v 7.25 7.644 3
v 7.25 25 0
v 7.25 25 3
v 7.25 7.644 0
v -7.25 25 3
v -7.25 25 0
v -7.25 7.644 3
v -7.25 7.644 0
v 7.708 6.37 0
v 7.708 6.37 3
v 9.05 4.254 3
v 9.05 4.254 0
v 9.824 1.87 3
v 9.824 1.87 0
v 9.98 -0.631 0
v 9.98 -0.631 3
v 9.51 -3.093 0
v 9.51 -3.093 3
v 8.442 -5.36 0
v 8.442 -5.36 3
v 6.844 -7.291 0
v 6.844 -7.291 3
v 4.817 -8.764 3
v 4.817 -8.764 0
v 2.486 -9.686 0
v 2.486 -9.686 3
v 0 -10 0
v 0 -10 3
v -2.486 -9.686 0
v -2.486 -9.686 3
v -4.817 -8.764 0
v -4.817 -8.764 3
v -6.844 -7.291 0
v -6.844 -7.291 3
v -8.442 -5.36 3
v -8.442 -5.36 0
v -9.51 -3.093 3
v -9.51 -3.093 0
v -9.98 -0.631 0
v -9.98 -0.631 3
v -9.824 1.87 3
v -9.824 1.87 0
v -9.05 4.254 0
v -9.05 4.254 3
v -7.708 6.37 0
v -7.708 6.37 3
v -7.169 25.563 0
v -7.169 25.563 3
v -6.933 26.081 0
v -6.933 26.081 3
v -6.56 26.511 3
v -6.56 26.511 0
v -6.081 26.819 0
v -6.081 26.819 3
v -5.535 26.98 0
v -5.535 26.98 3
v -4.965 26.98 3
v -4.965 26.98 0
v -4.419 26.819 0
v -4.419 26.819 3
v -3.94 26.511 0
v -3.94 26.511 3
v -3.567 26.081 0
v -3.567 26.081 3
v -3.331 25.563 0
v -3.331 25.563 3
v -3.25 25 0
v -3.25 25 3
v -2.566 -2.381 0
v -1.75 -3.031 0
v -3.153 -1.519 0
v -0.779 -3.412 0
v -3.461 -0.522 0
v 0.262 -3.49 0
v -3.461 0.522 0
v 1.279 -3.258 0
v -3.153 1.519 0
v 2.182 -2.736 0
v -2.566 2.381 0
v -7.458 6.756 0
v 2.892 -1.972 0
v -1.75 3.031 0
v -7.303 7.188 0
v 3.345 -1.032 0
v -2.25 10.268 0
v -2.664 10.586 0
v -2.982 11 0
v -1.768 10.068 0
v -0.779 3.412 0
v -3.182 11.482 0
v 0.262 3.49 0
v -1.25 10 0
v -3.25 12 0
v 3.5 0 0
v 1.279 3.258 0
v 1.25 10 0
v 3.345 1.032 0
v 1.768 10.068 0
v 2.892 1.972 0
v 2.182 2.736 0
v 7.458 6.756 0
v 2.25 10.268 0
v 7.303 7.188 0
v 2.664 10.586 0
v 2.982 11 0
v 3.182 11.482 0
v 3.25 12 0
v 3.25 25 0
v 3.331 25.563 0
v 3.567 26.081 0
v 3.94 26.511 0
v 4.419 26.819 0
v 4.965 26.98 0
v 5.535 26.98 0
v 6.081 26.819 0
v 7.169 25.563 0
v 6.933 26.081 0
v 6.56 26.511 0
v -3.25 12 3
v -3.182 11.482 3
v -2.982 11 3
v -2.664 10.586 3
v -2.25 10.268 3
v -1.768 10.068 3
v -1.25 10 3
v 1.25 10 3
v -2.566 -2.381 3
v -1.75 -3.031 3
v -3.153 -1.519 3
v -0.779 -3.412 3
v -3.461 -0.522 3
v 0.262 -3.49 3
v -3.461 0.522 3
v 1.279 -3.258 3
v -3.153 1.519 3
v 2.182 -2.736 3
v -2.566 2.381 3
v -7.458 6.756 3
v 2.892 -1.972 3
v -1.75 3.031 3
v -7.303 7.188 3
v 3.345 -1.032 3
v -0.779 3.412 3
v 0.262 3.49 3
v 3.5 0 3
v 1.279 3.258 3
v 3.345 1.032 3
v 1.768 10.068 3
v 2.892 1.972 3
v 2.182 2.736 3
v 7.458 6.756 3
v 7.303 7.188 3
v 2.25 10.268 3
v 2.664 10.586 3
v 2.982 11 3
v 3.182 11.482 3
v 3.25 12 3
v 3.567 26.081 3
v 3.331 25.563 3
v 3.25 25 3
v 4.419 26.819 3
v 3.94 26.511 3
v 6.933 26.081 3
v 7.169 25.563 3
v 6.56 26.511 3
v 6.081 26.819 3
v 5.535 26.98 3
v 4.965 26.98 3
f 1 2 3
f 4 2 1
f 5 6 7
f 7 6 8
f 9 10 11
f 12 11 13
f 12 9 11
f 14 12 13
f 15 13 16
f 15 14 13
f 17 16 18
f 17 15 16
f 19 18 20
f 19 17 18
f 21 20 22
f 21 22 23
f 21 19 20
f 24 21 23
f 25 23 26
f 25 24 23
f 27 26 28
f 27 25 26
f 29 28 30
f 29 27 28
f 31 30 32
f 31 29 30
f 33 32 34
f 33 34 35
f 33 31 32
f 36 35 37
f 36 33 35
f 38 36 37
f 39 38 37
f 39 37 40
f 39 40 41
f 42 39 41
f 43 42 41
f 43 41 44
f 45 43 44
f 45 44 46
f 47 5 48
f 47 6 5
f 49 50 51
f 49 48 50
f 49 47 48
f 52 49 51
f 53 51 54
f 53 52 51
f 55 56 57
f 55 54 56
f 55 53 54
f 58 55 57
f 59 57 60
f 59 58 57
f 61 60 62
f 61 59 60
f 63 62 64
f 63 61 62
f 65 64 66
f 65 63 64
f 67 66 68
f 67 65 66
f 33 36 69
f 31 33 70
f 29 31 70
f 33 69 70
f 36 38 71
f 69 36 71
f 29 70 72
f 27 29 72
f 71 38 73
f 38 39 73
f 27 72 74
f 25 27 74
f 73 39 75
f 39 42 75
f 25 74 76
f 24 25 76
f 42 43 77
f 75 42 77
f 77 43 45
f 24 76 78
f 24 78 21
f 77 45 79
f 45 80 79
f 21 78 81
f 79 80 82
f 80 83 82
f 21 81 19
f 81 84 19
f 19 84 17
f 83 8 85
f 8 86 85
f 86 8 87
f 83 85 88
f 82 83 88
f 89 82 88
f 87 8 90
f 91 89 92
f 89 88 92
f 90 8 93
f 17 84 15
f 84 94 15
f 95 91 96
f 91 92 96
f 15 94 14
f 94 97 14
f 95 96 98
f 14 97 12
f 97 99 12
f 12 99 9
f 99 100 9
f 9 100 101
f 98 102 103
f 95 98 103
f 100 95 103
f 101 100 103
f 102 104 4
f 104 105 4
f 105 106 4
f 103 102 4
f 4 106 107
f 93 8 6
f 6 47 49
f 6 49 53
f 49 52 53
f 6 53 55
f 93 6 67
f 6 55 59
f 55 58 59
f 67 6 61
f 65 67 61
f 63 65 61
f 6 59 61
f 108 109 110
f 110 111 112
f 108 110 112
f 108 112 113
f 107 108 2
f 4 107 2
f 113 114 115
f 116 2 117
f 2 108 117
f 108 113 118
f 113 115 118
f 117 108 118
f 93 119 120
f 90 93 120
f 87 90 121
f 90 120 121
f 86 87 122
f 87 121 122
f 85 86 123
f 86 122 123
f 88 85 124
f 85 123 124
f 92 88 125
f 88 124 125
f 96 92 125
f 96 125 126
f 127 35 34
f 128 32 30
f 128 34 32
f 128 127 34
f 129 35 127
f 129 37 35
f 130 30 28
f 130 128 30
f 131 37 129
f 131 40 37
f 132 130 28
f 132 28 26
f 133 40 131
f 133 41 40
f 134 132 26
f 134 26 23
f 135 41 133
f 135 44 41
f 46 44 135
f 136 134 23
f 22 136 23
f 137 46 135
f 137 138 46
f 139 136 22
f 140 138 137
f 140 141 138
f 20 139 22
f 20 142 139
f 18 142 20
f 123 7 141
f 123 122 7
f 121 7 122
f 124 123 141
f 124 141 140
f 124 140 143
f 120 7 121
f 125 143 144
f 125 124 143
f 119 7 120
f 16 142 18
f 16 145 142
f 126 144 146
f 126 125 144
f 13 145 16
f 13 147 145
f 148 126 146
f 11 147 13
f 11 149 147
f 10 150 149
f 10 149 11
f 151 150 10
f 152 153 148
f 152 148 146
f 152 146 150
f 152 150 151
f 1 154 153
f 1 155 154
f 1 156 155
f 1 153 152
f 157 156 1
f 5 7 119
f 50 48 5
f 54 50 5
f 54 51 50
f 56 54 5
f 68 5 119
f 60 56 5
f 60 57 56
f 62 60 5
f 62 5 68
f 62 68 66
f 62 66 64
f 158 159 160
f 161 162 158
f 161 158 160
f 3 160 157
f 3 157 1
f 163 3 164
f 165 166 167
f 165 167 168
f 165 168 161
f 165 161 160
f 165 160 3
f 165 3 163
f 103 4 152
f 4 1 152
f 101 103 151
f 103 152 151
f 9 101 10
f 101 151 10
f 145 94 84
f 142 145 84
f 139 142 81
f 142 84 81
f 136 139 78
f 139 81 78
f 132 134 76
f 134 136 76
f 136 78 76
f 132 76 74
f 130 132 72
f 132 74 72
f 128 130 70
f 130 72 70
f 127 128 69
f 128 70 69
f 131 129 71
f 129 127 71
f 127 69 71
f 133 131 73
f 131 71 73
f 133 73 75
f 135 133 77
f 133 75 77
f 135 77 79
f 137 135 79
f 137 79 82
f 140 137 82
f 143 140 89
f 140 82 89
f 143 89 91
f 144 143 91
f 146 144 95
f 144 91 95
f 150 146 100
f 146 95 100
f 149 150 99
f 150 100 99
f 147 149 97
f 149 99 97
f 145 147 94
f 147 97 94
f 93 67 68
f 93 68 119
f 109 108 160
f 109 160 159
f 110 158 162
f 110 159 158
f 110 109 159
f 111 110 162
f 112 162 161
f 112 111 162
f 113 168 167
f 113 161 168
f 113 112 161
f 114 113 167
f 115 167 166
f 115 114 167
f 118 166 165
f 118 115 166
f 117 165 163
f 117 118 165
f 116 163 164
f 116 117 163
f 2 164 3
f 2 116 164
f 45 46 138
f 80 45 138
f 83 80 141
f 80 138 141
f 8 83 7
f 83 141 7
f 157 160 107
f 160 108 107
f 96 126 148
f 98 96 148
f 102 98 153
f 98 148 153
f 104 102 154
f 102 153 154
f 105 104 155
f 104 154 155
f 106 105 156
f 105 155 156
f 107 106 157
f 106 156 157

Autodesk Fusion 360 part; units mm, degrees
sketch "Smartie Hopper servo arm" plane through (0, 0, 0) normal (0, 0, 1) x (1, 0, 0)
  circle A0 centre (0, 0) radius 10
  circle A1 centre (0, 0) radius 3.5
  line L0 (-3.25, 25) -> (-3.25, 10)
  line L1 (3.25, 25) -> (3.25, 10)
  line L2 (-7.25, 25) -> (-7.25, 6.8875)
  line L3 (7.25, 25) -> (7.25, 6.8875)
  line L4 (-3.25, 10) -> (3.25, 10)
  line L5 (-7.25, 25) -> (-3.25, 25)
  line L6 (3.25, 25) -> (7.25, 25)
  circle A2 centre (-5.25, 25) radius 2
  circle A3 centre (5.25, 25) radius 2
  dimension "d3" = 7
  dimension "d5" = 20
  dimension "d28" = 3.25
  dimension "d29" = 3.25
  dimension "d34" = 4
  dimension "d35" = 4
  dimension "d36" = 15
  dimension "d37" = 15
  dimension "d38" = 4
  dimension "d39" = 4
extrude "Extrude1" add sketch "Smartie Hopper servo arm" along normal blind 3
fillet "Fillet4" radius 2 2 edges at (3.25, 10, 1.5) (-3.25, 10, 1.5)
fillet "Fillet3" radius 2 2 edges at (7.25, 6.8875, 1.5) (-7.25, 6.8875, 1.5)
equation "stainless_steel_thickness = 3 mm" comment "The thickness of the 316 stainless steel sheets to laser cut."
equation "arm_thickness = 4 mm"
equation "d10 = stainless_steel_thickness"
equation "groove_diameter = 6.5 mm"
equation "groove_length = 17 mm"
equation "d28 = groove_diameter / 2"
equation "d29 = groove_diameter / 2"
equation "d34 = arm_thickness"
equation "d35 = arm_thickness"
equation "d36 = groove_length - ( arm_thickness / 2 )"
equation "d37 = groove_length - ( arm_thickness / 2 )"
equation "d38 = arm_thickness"
equation "d39 = arm_thickness"
